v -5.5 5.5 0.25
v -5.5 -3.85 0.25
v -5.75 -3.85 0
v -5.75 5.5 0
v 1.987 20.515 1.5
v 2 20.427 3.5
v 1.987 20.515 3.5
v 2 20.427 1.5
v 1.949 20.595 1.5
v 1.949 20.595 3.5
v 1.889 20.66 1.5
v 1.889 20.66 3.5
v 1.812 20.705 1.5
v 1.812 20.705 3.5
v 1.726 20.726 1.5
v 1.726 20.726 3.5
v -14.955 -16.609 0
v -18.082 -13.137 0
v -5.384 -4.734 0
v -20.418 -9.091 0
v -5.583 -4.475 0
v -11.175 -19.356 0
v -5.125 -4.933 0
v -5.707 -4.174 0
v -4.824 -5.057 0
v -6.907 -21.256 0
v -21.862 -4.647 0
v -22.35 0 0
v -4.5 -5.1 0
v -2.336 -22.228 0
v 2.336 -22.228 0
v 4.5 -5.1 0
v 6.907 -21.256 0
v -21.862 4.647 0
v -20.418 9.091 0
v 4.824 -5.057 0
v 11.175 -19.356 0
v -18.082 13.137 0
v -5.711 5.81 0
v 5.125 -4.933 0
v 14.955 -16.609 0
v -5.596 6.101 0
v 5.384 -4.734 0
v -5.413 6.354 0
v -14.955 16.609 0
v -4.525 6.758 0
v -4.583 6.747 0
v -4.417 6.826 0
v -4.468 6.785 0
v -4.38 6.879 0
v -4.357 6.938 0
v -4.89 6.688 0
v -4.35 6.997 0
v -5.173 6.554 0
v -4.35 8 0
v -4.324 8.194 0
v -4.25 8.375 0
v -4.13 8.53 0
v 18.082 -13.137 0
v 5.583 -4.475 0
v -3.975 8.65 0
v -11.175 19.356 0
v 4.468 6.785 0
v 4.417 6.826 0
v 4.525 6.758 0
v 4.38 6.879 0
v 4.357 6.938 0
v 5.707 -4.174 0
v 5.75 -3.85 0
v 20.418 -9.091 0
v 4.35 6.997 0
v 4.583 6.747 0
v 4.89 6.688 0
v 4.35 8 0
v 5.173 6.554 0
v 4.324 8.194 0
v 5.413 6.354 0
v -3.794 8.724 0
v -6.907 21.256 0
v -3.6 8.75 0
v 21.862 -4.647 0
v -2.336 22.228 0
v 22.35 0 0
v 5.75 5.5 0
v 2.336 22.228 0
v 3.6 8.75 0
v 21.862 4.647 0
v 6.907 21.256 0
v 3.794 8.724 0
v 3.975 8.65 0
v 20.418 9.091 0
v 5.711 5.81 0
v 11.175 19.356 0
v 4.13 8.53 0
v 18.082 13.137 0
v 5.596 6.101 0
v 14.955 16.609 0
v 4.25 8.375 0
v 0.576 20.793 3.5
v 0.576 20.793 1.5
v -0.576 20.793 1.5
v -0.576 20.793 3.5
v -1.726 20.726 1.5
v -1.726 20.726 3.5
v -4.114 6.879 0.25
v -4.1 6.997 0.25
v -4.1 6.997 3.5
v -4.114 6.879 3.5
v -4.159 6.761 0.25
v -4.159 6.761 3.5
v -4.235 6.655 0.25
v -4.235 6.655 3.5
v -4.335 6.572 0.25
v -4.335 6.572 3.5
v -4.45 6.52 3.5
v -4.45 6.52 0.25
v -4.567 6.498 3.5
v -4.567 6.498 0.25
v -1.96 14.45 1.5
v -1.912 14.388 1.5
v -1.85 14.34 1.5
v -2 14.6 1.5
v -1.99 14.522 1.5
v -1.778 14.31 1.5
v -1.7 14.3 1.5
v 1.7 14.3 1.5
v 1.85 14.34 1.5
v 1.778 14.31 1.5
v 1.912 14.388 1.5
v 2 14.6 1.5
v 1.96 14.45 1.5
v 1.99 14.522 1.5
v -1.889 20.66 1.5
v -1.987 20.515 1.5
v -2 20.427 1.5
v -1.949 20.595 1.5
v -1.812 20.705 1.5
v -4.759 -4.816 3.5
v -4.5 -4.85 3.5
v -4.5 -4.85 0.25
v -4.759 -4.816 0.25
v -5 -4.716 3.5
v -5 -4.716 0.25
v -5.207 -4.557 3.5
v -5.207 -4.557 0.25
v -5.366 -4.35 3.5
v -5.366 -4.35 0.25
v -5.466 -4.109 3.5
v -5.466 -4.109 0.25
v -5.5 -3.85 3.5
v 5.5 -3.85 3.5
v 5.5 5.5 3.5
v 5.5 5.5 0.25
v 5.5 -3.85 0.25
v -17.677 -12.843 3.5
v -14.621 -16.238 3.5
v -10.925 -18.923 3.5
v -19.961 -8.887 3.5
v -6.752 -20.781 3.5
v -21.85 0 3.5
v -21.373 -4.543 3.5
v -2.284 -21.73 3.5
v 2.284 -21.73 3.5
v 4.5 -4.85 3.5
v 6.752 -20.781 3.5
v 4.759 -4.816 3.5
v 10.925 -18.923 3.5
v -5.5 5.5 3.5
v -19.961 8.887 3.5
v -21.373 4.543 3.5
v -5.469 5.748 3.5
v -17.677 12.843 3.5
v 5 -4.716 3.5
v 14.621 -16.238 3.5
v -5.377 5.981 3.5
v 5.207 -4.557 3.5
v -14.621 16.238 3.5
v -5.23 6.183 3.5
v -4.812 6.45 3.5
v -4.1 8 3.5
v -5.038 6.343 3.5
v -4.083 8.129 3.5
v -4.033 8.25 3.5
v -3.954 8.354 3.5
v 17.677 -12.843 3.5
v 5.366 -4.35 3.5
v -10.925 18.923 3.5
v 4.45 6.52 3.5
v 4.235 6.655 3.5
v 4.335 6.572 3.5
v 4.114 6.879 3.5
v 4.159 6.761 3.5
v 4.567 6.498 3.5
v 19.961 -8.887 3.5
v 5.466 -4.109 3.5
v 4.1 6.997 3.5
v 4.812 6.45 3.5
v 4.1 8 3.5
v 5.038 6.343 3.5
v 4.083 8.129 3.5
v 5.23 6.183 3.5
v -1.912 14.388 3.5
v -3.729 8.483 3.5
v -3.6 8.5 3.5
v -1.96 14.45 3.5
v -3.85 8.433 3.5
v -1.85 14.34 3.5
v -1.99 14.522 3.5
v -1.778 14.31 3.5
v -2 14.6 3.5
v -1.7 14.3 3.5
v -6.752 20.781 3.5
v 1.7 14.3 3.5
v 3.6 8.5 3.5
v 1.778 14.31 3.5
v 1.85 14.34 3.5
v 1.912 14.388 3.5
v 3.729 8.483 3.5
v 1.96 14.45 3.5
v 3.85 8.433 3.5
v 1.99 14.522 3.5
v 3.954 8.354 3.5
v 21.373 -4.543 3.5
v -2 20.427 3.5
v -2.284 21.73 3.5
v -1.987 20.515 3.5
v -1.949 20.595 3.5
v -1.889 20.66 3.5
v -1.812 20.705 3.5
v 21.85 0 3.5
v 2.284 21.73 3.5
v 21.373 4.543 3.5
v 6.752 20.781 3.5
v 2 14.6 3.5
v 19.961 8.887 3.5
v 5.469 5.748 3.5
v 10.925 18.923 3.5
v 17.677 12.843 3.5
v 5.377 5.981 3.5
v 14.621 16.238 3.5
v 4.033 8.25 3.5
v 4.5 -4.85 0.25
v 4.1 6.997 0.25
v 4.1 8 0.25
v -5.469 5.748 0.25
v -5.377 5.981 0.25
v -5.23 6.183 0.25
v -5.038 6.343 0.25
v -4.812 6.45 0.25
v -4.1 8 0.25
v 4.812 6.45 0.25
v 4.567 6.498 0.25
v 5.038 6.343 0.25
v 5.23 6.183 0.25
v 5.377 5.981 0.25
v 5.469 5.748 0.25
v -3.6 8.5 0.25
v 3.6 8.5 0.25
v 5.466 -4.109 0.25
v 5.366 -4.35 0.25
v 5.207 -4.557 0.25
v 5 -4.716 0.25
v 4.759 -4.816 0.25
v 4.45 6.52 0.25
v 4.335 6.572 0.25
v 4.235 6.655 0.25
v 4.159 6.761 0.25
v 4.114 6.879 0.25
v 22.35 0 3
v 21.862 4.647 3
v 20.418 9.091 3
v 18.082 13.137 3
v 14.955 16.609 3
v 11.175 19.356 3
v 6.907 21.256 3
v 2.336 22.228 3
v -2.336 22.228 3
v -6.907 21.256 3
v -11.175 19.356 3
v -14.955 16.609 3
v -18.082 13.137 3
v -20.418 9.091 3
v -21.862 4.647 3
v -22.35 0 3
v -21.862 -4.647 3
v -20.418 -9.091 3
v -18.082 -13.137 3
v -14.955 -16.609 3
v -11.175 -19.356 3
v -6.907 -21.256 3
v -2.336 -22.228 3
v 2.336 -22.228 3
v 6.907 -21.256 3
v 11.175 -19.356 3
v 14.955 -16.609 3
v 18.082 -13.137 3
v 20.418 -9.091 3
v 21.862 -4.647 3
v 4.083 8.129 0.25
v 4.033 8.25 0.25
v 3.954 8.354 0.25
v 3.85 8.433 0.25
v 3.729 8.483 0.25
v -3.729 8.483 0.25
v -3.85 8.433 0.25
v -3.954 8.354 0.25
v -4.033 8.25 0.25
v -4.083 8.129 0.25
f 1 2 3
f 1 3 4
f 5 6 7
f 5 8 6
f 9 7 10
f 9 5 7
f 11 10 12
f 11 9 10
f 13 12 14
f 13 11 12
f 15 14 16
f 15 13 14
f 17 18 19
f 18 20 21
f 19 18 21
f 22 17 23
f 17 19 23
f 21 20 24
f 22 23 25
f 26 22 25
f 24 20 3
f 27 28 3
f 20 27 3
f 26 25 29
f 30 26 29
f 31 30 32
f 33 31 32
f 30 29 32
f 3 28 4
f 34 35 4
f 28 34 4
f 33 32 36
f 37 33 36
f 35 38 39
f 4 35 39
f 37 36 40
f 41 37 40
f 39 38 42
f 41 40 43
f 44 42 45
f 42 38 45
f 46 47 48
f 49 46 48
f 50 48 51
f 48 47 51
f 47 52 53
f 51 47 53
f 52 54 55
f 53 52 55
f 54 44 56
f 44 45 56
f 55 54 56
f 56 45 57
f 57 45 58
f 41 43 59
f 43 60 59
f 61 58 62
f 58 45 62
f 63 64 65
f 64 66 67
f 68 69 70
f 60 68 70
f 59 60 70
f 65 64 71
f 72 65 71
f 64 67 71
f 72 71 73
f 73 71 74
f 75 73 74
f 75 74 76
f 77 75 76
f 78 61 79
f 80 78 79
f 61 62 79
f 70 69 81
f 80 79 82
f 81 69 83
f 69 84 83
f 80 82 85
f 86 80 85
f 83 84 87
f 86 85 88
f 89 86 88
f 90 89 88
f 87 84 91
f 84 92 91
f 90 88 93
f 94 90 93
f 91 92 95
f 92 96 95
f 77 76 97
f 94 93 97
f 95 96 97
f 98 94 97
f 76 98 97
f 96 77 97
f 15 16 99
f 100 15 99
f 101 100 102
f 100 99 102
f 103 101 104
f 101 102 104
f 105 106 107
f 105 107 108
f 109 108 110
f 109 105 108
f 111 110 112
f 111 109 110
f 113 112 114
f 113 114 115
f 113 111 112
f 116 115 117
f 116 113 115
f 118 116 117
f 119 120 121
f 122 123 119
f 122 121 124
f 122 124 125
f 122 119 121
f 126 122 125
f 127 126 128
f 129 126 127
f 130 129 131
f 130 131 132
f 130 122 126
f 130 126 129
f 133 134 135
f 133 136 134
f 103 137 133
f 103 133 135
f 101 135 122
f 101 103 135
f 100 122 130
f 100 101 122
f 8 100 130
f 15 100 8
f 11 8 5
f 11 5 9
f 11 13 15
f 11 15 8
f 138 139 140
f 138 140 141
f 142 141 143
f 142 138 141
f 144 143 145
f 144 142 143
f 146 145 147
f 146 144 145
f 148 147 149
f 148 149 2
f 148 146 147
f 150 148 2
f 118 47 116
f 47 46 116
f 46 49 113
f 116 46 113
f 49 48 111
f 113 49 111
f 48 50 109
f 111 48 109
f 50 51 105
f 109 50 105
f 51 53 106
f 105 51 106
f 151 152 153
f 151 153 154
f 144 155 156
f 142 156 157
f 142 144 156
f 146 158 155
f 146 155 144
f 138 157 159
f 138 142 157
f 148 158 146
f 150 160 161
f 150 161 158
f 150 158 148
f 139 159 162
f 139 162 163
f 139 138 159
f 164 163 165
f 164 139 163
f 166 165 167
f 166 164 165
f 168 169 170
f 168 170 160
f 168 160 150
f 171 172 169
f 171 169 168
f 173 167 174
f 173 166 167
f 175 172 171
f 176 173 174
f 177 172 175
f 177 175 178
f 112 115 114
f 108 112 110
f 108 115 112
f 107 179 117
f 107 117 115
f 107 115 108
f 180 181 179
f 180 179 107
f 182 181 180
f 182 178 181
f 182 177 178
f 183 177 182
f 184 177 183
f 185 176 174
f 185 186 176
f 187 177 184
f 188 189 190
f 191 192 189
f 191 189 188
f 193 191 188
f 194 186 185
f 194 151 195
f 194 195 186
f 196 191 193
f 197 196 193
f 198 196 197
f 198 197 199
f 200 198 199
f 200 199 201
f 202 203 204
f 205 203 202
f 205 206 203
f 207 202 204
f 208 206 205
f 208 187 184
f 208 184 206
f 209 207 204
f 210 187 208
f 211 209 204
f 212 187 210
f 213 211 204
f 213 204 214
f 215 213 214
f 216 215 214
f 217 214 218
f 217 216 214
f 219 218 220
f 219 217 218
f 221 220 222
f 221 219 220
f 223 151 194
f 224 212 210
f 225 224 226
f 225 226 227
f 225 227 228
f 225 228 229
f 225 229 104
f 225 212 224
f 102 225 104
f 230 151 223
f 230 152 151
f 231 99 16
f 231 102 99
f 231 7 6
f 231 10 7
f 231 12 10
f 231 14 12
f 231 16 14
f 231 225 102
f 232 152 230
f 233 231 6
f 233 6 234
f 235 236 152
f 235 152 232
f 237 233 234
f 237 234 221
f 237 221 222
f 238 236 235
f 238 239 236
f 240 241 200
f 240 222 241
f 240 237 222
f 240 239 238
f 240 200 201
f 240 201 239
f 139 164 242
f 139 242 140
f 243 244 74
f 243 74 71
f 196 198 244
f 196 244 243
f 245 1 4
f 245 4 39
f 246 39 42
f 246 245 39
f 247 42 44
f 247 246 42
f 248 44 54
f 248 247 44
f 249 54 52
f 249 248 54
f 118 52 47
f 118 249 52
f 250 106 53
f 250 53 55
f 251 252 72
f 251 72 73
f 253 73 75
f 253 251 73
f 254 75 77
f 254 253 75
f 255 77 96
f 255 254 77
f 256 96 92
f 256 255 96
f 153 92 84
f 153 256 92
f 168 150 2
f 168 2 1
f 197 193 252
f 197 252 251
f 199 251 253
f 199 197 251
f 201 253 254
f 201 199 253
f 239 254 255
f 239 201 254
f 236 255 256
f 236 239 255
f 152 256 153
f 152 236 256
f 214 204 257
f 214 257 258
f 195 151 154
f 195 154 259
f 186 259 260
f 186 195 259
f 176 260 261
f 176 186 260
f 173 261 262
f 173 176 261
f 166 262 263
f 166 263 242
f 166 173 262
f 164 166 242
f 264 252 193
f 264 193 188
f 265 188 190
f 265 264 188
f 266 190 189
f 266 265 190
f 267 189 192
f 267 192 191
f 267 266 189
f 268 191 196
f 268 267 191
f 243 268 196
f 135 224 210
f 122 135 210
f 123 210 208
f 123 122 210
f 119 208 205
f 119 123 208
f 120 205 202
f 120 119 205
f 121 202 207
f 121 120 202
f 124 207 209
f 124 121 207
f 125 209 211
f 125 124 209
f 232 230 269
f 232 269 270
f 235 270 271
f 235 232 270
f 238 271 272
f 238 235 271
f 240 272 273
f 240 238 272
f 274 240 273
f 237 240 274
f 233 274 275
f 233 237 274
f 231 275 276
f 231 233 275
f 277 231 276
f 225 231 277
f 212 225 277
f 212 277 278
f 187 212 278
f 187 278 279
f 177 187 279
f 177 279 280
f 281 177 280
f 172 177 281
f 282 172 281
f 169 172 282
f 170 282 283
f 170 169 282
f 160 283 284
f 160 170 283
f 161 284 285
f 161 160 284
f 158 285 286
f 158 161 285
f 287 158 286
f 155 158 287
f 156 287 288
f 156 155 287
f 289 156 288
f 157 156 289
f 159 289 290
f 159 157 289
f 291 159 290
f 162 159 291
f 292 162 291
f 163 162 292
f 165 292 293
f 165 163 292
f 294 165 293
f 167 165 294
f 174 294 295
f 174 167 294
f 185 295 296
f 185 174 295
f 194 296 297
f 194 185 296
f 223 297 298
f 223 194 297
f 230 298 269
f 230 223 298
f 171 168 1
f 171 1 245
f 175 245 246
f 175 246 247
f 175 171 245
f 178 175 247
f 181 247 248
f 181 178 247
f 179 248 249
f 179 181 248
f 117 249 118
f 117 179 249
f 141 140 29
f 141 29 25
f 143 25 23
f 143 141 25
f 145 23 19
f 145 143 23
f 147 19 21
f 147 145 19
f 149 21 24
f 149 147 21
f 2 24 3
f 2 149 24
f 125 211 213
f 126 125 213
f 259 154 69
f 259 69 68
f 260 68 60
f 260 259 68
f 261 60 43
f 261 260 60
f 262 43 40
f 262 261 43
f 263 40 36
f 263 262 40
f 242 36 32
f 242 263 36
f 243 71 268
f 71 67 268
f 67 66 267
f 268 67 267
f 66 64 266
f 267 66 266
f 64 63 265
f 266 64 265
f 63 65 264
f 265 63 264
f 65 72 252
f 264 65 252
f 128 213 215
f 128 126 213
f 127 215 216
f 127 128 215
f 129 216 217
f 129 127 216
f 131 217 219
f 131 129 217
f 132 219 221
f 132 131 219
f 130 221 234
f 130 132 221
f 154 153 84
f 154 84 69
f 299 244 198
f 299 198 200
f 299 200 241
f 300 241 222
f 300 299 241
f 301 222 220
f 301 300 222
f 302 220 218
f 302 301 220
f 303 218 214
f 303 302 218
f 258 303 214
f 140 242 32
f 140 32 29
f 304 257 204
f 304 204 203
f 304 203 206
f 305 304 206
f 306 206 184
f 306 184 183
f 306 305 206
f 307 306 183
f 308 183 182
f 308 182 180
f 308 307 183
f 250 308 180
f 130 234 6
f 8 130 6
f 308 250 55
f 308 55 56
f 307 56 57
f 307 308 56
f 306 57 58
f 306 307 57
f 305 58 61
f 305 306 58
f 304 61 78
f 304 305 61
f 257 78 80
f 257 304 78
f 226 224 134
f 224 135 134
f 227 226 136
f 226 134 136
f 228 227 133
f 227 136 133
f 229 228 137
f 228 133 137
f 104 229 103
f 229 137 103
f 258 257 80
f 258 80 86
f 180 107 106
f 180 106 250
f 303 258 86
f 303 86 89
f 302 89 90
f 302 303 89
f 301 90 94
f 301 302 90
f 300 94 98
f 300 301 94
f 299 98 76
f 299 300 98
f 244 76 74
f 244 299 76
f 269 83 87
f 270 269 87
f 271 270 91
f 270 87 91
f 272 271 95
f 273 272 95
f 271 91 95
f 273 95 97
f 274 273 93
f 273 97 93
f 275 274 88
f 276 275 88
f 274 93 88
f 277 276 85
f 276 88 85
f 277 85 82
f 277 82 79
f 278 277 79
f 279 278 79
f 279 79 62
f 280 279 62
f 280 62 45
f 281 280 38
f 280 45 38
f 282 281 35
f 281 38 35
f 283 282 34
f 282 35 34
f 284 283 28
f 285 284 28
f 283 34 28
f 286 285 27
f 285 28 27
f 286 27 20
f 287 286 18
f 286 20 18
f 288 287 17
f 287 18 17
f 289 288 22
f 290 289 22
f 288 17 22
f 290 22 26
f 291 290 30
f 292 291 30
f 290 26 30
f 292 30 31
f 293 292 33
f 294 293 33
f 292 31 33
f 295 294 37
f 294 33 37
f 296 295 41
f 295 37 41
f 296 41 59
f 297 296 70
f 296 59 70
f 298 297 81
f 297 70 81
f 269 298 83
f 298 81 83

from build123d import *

# Parameters (mm, degrees)
SKETCH_1_R          = 22.35
EXTRUDE_1_DEPTH     = 3.5
CUT_EXTRUDE_START   = 3.5
CUT_EXTRUDE_1_DEPTH = 3.5
CHAMFER_1_SIZE      = 0.5
CUT_EXTRUDE_2_DEPTH = 3.5
FILLET_1_R          = 0.5
CHAMFER_2_SIZE      = 0.25
CUT_EXTRUDE_3_DEPTH = 2
FILLET_2_R          = 0.3


with BuildPart() as part:
    # 草图1 → 凸台-拉伸1 (new body)
    with BuildSketch(Plane.XY):
        Circle(SKETCH_1_R)
    extrude(amount=EXTRUDE_1_DEPTH)

    # 草图2 → 切除-拉伸1 (cut)
    with BuildSketch(Plane.XY.offset(CUT_EXTRUDE_START)):
        with BuildLine():
            Line((-5.5, 0), (-5.5, 5.5))
            ThreePointArc((-5.5, 5.5), (-5.207106781, 6.207106781), (-4.5, 6.5))
            Line((-4.5, 6.5), (4.5, 6.5))
            ThreePointArc((4.5, 6.5), (5.207106781, 6.207106781), (5.5, 5.5))
            Line((5.5, 5.5), (5.5, -3.85))
            ThreePointArc((5.5, -3.85), (5.207106781, -4.557106781), (4.5, -4.85))
            Line((4.5, -4.85), (-4.5, -4.85))
            ThreePointArc((-4.5, -4.85), (-5.207106781, -4.557106781), (-5.5, -3.85))
            Line((-5.5, -3.85), (-5.5, 0))
        make_face()
    extrude(amount=-CUT_EXTRUDE_1_DEPTH, mode=Mode.SUBTRACT)

    # 倒角1
    chamfer_1_edges = [part.edges().sort_by_distance(p)[0] for p in [
        (-22.35, 0, 3.5),
    ]]
    chamfer(chamfer_1_edges, length=CHAMFER_1_SIZE)

    # 草图3 → 切除-拉伸2 (cut)
    with BuildSketch(Plane.XY.offset(CUT_EXTRUDE_START)):
        Polygon((0, 6.5), (-4.1, 6.5), (-4.1, 8.5), (4.1, 8.5), (4.1, 6.5), align=None)
    extrude(amount=-CUT_EXTRUDE_2_DEPTH, mode=Mode.SUBTRACT)

    # 圆角1
    fillet_1_edges = [part.edges().sort_by_distance(p)[0] for p in [
        (4.1, 6.5, 1.75),
        (-4.1, 6.5, 1.75),
        (4.1, 8.5, 1.75),
        (-4.1, 8.5, 1.75),
    ]]
    fillet(fillet_1_edges, radius=FILLET_1_R)

    # 倒角2
    chamfer_2_edges = [part.edges().sort_by_distance(p)[0] for p in [
        (-5.5, 0.825, 0),
        (0, -4.85, 0),
        (5.5, 0.825, 0),
        (-5.230296743, 6.183130051, 0),
        (5.207106781, -4.557106781, 0),
        (-5.207106781, -4.557106781, 0),
        (4.1, 7.498331477, 0),
        (5.230296743, 6.183130051, 0),
        (-4.1, 7.498331477, 0),
        (0, 8.5, 0),
        (-4.234851628, 6.655097929, 0),
        (4.234851628, 6.655097929, 0),
        (3.953553391, 8.353553391, 0),
        (-3.953553391, 8.353553391, 0),
    ]]
    chamfer(chamfer_2_edges, length=CHAMFER_2_SIZE)

    # 草图4 → 切除-拉伸3 (cut)
    with BuildSketch(Plane.XY.offset(CUT_EXTRUDE_START)):
        with BuildLine():
            Line((-2, 20.7), (-2, 19.7))
            Line((-2, 19.7), (-2, 14.3))
            Line((-2, 14.3), (0, 14.3))
            Line((0, 14.3), (2, 14.3))
            Line((2, 14.3), (2, 19.7))
            Line((2, 19.7), (2, 20.7))
            ThreePointArc((2, 20.7), (0, 20.801262586), (-2, 20.7))
        make_face()
    extrude(amount=-CUT_EXTRUDE_3_DEPTH, mode=Mode.SUBTRACT)

    # 圆角2
    fillet_2_edges = [part.edges().sort_by_distance(p)[0] for p in [
        (-2, 20.7, 2.5),
        (2, 20.7, 2.5),
        (2, 14.3, 2.5),
        (-2, 14.3, 2.5),
    ]]
    fillet(fillet_2_edges, radius=FILLET_2_R)


solid = part.part
